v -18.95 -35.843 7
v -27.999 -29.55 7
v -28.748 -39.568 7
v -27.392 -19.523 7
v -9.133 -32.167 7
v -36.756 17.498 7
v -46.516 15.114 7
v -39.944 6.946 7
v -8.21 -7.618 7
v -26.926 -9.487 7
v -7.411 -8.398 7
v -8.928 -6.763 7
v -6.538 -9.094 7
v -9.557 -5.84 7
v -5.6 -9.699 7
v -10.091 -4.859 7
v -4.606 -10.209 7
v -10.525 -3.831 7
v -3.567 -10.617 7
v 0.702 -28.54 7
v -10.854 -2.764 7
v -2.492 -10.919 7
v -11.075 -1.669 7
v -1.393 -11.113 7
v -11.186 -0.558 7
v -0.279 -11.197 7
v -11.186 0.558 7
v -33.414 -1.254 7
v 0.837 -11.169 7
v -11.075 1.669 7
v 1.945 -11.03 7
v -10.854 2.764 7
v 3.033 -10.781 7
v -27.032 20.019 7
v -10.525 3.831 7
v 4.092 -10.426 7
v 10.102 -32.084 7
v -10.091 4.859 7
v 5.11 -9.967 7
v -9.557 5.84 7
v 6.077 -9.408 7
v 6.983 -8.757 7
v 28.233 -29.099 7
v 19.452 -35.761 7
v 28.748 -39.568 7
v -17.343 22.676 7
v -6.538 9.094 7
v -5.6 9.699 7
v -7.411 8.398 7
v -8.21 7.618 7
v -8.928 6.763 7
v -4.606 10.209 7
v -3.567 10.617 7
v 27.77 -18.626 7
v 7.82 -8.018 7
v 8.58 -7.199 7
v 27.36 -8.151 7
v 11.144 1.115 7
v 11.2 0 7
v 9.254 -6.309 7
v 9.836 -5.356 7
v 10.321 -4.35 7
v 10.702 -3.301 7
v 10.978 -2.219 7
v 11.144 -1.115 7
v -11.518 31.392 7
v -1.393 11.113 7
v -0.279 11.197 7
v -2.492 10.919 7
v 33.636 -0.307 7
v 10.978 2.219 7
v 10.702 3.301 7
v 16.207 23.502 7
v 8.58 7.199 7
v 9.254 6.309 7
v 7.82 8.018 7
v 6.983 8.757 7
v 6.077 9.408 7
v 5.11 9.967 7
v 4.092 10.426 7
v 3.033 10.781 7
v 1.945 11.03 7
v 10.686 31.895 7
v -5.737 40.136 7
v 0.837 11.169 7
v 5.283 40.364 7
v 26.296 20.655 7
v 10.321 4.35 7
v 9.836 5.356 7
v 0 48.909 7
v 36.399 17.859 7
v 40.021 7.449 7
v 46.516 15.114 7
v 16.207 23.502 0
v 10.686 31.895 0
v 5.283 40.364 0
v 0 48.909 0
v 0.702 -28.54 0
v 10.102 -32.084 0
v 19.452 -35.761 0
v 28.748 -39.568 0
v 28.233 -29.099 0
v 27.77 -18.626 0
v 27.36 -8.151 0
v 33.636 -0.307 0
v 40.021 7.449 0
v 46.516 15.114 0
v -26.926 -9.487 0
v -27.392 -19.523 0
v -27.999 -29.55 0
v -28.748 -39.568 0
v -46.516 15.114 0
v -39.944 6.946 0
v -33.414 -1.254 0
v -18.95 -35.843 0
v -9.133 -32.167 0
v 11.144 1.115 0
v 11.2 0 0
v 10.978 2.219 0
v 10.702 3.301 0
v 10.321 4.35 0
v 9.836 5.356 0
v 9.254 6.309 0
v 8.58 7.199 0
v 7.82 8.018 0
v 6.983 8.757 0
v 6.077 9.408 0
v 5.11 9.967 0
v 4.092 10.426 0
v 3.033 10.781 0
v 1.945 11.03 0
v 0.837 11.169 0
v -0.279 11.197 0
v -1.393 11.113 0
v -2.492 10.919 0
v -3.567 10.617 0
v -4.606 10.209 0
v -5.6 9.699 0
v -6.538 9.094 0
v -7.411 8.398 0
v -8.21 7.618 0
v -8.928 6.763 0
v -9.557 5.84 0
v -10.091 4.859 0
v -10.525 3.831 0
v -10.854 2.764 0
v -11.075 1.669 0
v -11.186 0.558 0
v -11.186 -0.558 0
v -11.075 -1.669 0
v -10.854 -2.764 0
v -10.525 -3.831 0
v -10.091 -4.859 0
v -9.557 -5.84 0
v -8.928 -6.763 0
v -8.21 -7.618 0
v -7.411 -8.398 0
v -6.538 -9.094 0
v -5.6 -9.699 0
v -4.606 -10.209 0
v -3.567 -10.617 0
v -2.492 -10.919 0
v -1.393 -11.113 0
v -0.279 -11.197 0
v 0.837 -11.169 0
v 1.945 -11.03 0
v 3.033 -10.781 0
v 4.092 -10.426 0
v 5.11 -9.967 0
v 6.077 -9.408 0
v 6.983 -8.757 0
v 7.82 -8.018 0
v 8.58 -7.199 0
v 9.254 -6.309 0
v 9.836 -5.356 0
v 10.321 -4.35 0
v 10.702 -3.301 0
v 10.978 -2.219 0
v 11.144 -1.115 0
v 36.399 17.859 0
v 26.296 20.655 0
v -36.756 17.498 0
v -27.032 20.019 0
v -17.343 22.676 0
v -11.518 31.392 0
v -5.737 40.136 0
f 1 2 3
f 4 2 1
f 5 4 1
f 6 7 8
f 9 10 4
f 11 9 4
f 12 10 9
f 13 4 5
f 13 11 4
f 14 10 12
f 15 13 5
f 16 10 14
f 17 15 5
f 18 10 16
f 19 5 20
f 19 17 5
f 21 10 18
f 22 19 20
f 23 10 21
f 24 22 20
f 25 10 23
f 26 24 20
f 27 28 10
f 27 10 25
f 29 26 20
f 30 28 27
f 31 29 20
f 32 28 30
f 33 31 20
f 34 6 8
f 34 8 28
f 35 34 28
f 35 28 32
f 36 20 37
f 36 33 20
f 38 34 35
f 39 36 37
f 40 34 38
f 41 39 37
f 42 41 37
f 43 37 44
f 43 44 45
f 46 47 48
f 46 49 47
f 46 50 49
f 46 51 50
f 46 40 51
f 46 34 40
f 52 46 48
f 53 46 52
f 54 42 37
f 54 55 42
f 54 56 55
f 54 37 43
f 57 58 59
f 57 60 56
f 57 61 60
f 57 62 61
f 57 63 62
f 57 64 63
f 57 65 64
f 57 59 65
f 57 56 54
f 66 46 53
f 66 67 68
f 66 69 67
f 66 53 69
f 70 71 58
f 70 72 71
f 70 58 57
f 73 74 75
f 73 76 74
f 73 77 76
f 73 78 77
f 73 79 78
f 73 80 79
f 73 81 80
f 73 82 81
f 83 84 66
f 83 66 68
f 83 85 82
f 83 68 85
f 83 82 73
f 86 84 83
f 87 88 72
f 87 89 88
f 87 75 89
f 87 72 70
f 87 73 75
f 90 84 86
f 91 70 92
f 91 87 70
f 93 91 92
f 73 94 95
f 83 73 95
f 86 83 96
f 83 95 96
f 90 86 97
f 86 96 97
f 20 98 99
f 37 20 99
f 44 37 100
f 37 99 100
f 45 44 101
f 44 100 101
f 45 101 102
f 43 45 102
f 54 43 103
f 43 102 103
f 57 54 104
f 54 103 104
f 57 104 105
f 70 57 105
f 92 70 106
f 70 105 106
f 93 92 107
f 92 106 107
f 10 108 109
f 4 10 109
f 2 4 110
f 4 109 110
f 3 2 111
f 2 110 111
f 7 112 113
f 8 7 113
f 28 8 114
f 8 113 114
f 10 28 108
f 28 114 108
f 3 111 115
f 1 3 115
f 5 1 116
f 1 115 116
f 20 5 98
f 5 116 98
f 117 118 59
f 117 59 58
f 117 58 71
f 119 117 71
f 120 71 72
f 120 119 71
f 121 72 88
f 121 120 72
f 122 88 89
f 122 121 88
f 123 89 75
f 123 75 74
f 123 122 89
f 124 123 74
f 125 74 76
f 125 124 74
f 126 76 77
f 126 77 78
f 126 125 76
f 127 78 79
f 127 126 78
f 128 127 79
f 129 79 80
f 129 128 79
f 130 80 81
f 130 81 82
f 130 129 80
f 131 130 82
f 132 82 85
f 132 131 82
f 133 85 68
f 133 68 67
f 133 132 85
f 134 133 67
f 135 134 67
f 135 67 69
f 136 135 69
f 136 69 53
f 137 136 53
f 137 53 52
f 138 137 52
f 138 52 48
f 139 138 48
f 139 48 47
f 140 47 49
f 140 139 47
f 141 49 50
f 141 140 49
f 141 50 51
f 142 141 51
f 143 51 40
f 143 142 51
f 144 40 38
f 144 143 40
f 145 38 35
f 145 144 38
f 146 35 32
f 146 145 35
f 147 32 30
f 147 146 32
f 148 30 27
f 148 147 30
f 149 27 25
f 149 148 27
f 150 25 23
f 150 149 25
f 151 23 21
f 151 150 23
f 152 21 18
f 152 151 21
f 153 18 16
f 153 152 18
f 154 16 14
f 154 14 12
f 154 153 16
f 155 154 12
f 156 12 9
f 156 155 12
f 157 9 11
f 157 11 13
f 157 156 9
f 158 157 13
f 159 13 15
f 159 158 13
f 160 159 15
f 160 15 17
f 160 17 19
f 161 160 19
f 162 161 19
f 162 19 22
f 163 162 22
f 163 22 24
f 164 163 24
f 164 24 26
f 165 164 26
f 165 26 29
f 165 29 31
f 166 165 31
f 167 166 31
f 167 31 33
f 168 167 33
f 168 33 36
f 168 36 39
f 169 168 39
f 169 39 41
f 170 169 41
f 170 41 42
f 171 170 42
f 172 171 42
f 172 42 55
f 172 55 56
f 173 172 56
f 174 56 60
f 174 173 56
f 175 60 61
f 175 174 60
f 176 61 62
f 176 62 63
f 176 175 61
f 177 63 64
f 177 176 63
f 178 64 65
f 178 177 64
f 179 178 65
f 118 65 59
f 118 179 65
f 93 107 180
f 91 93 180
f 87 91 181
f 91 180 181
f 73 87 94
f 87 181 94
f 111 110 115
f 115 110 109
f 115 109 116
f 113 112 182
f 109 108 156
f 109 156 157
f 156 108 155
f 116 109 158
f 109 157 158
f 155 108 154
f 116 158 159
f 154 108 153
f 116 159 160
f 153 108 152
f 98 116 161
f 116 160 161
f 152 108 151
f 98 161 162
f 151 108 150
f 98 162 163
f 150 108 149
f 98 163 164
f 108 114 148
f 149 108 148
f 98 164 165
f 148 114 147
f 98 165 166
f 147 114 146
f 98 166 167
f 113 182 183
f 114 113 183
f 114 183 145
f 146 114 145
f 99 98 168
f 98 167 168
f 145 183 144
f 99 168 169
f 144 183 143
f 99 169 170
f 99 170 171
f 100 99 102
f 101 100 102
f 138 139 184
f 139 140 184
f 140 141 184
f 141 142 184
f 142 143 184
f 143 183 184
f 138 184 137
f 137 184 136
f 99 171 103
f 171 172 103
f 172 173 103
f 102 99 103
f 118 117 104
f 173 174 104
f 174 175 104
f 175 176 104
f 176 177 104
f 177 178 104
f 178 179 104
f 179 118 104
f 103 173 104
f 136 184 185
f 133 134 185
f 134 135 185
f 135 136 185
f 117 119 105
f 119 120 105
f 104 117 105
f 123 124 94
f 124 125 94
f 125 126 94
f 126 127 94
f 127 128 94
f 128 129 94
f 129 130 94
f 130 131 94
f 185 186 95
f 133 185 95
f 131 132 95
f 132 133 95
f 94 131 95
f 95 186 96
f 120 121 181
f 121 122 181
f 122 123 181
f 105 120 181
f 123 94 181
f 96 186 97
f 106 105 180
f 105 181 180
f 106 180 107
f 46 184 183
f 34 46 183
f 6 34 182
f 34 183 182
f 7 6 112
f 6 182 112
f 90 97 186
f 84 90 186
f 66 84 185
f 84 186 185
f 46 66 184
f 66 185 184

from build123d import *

# Parameters (mm, degrees)
F0_R     = 11.2
F1_DEPTH = 7


with BuildPart() as f1:
    # F0 (on Top) → F1 (new body)
    with BuildSketch(Plane.XY):
        with BuildLine():
            ThreePointArc((0, 48.90934), (-8.622128, 35.760107), (-17.34349, 22.676482))
            ThreePointArc((-17.34349, 22.676482), (-31.889544, 18.740952), (-46.515547, 15.113817))
            ThreePointArc((-46.515547, 15.113817), (-36.674267, 2.85035), (-26.926049, -9.487221))
            ThreePointArc((-26.926049, -9.487221), (-27.678115, -24.537486), (-28.748189, -39.568487))
            ThreePointArc((-28.748189, -39.568487), (-14.043816, -33.998494), (0.702277, -28.539907))
            ThreePointArc((0.702277, -28.539907), (14.783528, -33.905952), (28.748189, -39.568487))
            ThreePointArc((28.748189, -39.568487), (27.994711, -23.862575), (27.36008, -8.151411))
            ThreePointArc((27.36008, -8.151411), (36.814838, 3.582455), (46.515547, 15.113817))
            ThreePointArc((46.515547, 15.113817), (31.345499, 19.250612), (16.207183, 23.502058))
            ThreePointArc((16.207183, 23.502058), (7.969293, 36.120031), (0, 48.90934))
        make_face()
        Circle(F0_R, mode=Mode.SUBTRACT)
    extrude(amount=F1_DEPTH)


solid = f1.part
